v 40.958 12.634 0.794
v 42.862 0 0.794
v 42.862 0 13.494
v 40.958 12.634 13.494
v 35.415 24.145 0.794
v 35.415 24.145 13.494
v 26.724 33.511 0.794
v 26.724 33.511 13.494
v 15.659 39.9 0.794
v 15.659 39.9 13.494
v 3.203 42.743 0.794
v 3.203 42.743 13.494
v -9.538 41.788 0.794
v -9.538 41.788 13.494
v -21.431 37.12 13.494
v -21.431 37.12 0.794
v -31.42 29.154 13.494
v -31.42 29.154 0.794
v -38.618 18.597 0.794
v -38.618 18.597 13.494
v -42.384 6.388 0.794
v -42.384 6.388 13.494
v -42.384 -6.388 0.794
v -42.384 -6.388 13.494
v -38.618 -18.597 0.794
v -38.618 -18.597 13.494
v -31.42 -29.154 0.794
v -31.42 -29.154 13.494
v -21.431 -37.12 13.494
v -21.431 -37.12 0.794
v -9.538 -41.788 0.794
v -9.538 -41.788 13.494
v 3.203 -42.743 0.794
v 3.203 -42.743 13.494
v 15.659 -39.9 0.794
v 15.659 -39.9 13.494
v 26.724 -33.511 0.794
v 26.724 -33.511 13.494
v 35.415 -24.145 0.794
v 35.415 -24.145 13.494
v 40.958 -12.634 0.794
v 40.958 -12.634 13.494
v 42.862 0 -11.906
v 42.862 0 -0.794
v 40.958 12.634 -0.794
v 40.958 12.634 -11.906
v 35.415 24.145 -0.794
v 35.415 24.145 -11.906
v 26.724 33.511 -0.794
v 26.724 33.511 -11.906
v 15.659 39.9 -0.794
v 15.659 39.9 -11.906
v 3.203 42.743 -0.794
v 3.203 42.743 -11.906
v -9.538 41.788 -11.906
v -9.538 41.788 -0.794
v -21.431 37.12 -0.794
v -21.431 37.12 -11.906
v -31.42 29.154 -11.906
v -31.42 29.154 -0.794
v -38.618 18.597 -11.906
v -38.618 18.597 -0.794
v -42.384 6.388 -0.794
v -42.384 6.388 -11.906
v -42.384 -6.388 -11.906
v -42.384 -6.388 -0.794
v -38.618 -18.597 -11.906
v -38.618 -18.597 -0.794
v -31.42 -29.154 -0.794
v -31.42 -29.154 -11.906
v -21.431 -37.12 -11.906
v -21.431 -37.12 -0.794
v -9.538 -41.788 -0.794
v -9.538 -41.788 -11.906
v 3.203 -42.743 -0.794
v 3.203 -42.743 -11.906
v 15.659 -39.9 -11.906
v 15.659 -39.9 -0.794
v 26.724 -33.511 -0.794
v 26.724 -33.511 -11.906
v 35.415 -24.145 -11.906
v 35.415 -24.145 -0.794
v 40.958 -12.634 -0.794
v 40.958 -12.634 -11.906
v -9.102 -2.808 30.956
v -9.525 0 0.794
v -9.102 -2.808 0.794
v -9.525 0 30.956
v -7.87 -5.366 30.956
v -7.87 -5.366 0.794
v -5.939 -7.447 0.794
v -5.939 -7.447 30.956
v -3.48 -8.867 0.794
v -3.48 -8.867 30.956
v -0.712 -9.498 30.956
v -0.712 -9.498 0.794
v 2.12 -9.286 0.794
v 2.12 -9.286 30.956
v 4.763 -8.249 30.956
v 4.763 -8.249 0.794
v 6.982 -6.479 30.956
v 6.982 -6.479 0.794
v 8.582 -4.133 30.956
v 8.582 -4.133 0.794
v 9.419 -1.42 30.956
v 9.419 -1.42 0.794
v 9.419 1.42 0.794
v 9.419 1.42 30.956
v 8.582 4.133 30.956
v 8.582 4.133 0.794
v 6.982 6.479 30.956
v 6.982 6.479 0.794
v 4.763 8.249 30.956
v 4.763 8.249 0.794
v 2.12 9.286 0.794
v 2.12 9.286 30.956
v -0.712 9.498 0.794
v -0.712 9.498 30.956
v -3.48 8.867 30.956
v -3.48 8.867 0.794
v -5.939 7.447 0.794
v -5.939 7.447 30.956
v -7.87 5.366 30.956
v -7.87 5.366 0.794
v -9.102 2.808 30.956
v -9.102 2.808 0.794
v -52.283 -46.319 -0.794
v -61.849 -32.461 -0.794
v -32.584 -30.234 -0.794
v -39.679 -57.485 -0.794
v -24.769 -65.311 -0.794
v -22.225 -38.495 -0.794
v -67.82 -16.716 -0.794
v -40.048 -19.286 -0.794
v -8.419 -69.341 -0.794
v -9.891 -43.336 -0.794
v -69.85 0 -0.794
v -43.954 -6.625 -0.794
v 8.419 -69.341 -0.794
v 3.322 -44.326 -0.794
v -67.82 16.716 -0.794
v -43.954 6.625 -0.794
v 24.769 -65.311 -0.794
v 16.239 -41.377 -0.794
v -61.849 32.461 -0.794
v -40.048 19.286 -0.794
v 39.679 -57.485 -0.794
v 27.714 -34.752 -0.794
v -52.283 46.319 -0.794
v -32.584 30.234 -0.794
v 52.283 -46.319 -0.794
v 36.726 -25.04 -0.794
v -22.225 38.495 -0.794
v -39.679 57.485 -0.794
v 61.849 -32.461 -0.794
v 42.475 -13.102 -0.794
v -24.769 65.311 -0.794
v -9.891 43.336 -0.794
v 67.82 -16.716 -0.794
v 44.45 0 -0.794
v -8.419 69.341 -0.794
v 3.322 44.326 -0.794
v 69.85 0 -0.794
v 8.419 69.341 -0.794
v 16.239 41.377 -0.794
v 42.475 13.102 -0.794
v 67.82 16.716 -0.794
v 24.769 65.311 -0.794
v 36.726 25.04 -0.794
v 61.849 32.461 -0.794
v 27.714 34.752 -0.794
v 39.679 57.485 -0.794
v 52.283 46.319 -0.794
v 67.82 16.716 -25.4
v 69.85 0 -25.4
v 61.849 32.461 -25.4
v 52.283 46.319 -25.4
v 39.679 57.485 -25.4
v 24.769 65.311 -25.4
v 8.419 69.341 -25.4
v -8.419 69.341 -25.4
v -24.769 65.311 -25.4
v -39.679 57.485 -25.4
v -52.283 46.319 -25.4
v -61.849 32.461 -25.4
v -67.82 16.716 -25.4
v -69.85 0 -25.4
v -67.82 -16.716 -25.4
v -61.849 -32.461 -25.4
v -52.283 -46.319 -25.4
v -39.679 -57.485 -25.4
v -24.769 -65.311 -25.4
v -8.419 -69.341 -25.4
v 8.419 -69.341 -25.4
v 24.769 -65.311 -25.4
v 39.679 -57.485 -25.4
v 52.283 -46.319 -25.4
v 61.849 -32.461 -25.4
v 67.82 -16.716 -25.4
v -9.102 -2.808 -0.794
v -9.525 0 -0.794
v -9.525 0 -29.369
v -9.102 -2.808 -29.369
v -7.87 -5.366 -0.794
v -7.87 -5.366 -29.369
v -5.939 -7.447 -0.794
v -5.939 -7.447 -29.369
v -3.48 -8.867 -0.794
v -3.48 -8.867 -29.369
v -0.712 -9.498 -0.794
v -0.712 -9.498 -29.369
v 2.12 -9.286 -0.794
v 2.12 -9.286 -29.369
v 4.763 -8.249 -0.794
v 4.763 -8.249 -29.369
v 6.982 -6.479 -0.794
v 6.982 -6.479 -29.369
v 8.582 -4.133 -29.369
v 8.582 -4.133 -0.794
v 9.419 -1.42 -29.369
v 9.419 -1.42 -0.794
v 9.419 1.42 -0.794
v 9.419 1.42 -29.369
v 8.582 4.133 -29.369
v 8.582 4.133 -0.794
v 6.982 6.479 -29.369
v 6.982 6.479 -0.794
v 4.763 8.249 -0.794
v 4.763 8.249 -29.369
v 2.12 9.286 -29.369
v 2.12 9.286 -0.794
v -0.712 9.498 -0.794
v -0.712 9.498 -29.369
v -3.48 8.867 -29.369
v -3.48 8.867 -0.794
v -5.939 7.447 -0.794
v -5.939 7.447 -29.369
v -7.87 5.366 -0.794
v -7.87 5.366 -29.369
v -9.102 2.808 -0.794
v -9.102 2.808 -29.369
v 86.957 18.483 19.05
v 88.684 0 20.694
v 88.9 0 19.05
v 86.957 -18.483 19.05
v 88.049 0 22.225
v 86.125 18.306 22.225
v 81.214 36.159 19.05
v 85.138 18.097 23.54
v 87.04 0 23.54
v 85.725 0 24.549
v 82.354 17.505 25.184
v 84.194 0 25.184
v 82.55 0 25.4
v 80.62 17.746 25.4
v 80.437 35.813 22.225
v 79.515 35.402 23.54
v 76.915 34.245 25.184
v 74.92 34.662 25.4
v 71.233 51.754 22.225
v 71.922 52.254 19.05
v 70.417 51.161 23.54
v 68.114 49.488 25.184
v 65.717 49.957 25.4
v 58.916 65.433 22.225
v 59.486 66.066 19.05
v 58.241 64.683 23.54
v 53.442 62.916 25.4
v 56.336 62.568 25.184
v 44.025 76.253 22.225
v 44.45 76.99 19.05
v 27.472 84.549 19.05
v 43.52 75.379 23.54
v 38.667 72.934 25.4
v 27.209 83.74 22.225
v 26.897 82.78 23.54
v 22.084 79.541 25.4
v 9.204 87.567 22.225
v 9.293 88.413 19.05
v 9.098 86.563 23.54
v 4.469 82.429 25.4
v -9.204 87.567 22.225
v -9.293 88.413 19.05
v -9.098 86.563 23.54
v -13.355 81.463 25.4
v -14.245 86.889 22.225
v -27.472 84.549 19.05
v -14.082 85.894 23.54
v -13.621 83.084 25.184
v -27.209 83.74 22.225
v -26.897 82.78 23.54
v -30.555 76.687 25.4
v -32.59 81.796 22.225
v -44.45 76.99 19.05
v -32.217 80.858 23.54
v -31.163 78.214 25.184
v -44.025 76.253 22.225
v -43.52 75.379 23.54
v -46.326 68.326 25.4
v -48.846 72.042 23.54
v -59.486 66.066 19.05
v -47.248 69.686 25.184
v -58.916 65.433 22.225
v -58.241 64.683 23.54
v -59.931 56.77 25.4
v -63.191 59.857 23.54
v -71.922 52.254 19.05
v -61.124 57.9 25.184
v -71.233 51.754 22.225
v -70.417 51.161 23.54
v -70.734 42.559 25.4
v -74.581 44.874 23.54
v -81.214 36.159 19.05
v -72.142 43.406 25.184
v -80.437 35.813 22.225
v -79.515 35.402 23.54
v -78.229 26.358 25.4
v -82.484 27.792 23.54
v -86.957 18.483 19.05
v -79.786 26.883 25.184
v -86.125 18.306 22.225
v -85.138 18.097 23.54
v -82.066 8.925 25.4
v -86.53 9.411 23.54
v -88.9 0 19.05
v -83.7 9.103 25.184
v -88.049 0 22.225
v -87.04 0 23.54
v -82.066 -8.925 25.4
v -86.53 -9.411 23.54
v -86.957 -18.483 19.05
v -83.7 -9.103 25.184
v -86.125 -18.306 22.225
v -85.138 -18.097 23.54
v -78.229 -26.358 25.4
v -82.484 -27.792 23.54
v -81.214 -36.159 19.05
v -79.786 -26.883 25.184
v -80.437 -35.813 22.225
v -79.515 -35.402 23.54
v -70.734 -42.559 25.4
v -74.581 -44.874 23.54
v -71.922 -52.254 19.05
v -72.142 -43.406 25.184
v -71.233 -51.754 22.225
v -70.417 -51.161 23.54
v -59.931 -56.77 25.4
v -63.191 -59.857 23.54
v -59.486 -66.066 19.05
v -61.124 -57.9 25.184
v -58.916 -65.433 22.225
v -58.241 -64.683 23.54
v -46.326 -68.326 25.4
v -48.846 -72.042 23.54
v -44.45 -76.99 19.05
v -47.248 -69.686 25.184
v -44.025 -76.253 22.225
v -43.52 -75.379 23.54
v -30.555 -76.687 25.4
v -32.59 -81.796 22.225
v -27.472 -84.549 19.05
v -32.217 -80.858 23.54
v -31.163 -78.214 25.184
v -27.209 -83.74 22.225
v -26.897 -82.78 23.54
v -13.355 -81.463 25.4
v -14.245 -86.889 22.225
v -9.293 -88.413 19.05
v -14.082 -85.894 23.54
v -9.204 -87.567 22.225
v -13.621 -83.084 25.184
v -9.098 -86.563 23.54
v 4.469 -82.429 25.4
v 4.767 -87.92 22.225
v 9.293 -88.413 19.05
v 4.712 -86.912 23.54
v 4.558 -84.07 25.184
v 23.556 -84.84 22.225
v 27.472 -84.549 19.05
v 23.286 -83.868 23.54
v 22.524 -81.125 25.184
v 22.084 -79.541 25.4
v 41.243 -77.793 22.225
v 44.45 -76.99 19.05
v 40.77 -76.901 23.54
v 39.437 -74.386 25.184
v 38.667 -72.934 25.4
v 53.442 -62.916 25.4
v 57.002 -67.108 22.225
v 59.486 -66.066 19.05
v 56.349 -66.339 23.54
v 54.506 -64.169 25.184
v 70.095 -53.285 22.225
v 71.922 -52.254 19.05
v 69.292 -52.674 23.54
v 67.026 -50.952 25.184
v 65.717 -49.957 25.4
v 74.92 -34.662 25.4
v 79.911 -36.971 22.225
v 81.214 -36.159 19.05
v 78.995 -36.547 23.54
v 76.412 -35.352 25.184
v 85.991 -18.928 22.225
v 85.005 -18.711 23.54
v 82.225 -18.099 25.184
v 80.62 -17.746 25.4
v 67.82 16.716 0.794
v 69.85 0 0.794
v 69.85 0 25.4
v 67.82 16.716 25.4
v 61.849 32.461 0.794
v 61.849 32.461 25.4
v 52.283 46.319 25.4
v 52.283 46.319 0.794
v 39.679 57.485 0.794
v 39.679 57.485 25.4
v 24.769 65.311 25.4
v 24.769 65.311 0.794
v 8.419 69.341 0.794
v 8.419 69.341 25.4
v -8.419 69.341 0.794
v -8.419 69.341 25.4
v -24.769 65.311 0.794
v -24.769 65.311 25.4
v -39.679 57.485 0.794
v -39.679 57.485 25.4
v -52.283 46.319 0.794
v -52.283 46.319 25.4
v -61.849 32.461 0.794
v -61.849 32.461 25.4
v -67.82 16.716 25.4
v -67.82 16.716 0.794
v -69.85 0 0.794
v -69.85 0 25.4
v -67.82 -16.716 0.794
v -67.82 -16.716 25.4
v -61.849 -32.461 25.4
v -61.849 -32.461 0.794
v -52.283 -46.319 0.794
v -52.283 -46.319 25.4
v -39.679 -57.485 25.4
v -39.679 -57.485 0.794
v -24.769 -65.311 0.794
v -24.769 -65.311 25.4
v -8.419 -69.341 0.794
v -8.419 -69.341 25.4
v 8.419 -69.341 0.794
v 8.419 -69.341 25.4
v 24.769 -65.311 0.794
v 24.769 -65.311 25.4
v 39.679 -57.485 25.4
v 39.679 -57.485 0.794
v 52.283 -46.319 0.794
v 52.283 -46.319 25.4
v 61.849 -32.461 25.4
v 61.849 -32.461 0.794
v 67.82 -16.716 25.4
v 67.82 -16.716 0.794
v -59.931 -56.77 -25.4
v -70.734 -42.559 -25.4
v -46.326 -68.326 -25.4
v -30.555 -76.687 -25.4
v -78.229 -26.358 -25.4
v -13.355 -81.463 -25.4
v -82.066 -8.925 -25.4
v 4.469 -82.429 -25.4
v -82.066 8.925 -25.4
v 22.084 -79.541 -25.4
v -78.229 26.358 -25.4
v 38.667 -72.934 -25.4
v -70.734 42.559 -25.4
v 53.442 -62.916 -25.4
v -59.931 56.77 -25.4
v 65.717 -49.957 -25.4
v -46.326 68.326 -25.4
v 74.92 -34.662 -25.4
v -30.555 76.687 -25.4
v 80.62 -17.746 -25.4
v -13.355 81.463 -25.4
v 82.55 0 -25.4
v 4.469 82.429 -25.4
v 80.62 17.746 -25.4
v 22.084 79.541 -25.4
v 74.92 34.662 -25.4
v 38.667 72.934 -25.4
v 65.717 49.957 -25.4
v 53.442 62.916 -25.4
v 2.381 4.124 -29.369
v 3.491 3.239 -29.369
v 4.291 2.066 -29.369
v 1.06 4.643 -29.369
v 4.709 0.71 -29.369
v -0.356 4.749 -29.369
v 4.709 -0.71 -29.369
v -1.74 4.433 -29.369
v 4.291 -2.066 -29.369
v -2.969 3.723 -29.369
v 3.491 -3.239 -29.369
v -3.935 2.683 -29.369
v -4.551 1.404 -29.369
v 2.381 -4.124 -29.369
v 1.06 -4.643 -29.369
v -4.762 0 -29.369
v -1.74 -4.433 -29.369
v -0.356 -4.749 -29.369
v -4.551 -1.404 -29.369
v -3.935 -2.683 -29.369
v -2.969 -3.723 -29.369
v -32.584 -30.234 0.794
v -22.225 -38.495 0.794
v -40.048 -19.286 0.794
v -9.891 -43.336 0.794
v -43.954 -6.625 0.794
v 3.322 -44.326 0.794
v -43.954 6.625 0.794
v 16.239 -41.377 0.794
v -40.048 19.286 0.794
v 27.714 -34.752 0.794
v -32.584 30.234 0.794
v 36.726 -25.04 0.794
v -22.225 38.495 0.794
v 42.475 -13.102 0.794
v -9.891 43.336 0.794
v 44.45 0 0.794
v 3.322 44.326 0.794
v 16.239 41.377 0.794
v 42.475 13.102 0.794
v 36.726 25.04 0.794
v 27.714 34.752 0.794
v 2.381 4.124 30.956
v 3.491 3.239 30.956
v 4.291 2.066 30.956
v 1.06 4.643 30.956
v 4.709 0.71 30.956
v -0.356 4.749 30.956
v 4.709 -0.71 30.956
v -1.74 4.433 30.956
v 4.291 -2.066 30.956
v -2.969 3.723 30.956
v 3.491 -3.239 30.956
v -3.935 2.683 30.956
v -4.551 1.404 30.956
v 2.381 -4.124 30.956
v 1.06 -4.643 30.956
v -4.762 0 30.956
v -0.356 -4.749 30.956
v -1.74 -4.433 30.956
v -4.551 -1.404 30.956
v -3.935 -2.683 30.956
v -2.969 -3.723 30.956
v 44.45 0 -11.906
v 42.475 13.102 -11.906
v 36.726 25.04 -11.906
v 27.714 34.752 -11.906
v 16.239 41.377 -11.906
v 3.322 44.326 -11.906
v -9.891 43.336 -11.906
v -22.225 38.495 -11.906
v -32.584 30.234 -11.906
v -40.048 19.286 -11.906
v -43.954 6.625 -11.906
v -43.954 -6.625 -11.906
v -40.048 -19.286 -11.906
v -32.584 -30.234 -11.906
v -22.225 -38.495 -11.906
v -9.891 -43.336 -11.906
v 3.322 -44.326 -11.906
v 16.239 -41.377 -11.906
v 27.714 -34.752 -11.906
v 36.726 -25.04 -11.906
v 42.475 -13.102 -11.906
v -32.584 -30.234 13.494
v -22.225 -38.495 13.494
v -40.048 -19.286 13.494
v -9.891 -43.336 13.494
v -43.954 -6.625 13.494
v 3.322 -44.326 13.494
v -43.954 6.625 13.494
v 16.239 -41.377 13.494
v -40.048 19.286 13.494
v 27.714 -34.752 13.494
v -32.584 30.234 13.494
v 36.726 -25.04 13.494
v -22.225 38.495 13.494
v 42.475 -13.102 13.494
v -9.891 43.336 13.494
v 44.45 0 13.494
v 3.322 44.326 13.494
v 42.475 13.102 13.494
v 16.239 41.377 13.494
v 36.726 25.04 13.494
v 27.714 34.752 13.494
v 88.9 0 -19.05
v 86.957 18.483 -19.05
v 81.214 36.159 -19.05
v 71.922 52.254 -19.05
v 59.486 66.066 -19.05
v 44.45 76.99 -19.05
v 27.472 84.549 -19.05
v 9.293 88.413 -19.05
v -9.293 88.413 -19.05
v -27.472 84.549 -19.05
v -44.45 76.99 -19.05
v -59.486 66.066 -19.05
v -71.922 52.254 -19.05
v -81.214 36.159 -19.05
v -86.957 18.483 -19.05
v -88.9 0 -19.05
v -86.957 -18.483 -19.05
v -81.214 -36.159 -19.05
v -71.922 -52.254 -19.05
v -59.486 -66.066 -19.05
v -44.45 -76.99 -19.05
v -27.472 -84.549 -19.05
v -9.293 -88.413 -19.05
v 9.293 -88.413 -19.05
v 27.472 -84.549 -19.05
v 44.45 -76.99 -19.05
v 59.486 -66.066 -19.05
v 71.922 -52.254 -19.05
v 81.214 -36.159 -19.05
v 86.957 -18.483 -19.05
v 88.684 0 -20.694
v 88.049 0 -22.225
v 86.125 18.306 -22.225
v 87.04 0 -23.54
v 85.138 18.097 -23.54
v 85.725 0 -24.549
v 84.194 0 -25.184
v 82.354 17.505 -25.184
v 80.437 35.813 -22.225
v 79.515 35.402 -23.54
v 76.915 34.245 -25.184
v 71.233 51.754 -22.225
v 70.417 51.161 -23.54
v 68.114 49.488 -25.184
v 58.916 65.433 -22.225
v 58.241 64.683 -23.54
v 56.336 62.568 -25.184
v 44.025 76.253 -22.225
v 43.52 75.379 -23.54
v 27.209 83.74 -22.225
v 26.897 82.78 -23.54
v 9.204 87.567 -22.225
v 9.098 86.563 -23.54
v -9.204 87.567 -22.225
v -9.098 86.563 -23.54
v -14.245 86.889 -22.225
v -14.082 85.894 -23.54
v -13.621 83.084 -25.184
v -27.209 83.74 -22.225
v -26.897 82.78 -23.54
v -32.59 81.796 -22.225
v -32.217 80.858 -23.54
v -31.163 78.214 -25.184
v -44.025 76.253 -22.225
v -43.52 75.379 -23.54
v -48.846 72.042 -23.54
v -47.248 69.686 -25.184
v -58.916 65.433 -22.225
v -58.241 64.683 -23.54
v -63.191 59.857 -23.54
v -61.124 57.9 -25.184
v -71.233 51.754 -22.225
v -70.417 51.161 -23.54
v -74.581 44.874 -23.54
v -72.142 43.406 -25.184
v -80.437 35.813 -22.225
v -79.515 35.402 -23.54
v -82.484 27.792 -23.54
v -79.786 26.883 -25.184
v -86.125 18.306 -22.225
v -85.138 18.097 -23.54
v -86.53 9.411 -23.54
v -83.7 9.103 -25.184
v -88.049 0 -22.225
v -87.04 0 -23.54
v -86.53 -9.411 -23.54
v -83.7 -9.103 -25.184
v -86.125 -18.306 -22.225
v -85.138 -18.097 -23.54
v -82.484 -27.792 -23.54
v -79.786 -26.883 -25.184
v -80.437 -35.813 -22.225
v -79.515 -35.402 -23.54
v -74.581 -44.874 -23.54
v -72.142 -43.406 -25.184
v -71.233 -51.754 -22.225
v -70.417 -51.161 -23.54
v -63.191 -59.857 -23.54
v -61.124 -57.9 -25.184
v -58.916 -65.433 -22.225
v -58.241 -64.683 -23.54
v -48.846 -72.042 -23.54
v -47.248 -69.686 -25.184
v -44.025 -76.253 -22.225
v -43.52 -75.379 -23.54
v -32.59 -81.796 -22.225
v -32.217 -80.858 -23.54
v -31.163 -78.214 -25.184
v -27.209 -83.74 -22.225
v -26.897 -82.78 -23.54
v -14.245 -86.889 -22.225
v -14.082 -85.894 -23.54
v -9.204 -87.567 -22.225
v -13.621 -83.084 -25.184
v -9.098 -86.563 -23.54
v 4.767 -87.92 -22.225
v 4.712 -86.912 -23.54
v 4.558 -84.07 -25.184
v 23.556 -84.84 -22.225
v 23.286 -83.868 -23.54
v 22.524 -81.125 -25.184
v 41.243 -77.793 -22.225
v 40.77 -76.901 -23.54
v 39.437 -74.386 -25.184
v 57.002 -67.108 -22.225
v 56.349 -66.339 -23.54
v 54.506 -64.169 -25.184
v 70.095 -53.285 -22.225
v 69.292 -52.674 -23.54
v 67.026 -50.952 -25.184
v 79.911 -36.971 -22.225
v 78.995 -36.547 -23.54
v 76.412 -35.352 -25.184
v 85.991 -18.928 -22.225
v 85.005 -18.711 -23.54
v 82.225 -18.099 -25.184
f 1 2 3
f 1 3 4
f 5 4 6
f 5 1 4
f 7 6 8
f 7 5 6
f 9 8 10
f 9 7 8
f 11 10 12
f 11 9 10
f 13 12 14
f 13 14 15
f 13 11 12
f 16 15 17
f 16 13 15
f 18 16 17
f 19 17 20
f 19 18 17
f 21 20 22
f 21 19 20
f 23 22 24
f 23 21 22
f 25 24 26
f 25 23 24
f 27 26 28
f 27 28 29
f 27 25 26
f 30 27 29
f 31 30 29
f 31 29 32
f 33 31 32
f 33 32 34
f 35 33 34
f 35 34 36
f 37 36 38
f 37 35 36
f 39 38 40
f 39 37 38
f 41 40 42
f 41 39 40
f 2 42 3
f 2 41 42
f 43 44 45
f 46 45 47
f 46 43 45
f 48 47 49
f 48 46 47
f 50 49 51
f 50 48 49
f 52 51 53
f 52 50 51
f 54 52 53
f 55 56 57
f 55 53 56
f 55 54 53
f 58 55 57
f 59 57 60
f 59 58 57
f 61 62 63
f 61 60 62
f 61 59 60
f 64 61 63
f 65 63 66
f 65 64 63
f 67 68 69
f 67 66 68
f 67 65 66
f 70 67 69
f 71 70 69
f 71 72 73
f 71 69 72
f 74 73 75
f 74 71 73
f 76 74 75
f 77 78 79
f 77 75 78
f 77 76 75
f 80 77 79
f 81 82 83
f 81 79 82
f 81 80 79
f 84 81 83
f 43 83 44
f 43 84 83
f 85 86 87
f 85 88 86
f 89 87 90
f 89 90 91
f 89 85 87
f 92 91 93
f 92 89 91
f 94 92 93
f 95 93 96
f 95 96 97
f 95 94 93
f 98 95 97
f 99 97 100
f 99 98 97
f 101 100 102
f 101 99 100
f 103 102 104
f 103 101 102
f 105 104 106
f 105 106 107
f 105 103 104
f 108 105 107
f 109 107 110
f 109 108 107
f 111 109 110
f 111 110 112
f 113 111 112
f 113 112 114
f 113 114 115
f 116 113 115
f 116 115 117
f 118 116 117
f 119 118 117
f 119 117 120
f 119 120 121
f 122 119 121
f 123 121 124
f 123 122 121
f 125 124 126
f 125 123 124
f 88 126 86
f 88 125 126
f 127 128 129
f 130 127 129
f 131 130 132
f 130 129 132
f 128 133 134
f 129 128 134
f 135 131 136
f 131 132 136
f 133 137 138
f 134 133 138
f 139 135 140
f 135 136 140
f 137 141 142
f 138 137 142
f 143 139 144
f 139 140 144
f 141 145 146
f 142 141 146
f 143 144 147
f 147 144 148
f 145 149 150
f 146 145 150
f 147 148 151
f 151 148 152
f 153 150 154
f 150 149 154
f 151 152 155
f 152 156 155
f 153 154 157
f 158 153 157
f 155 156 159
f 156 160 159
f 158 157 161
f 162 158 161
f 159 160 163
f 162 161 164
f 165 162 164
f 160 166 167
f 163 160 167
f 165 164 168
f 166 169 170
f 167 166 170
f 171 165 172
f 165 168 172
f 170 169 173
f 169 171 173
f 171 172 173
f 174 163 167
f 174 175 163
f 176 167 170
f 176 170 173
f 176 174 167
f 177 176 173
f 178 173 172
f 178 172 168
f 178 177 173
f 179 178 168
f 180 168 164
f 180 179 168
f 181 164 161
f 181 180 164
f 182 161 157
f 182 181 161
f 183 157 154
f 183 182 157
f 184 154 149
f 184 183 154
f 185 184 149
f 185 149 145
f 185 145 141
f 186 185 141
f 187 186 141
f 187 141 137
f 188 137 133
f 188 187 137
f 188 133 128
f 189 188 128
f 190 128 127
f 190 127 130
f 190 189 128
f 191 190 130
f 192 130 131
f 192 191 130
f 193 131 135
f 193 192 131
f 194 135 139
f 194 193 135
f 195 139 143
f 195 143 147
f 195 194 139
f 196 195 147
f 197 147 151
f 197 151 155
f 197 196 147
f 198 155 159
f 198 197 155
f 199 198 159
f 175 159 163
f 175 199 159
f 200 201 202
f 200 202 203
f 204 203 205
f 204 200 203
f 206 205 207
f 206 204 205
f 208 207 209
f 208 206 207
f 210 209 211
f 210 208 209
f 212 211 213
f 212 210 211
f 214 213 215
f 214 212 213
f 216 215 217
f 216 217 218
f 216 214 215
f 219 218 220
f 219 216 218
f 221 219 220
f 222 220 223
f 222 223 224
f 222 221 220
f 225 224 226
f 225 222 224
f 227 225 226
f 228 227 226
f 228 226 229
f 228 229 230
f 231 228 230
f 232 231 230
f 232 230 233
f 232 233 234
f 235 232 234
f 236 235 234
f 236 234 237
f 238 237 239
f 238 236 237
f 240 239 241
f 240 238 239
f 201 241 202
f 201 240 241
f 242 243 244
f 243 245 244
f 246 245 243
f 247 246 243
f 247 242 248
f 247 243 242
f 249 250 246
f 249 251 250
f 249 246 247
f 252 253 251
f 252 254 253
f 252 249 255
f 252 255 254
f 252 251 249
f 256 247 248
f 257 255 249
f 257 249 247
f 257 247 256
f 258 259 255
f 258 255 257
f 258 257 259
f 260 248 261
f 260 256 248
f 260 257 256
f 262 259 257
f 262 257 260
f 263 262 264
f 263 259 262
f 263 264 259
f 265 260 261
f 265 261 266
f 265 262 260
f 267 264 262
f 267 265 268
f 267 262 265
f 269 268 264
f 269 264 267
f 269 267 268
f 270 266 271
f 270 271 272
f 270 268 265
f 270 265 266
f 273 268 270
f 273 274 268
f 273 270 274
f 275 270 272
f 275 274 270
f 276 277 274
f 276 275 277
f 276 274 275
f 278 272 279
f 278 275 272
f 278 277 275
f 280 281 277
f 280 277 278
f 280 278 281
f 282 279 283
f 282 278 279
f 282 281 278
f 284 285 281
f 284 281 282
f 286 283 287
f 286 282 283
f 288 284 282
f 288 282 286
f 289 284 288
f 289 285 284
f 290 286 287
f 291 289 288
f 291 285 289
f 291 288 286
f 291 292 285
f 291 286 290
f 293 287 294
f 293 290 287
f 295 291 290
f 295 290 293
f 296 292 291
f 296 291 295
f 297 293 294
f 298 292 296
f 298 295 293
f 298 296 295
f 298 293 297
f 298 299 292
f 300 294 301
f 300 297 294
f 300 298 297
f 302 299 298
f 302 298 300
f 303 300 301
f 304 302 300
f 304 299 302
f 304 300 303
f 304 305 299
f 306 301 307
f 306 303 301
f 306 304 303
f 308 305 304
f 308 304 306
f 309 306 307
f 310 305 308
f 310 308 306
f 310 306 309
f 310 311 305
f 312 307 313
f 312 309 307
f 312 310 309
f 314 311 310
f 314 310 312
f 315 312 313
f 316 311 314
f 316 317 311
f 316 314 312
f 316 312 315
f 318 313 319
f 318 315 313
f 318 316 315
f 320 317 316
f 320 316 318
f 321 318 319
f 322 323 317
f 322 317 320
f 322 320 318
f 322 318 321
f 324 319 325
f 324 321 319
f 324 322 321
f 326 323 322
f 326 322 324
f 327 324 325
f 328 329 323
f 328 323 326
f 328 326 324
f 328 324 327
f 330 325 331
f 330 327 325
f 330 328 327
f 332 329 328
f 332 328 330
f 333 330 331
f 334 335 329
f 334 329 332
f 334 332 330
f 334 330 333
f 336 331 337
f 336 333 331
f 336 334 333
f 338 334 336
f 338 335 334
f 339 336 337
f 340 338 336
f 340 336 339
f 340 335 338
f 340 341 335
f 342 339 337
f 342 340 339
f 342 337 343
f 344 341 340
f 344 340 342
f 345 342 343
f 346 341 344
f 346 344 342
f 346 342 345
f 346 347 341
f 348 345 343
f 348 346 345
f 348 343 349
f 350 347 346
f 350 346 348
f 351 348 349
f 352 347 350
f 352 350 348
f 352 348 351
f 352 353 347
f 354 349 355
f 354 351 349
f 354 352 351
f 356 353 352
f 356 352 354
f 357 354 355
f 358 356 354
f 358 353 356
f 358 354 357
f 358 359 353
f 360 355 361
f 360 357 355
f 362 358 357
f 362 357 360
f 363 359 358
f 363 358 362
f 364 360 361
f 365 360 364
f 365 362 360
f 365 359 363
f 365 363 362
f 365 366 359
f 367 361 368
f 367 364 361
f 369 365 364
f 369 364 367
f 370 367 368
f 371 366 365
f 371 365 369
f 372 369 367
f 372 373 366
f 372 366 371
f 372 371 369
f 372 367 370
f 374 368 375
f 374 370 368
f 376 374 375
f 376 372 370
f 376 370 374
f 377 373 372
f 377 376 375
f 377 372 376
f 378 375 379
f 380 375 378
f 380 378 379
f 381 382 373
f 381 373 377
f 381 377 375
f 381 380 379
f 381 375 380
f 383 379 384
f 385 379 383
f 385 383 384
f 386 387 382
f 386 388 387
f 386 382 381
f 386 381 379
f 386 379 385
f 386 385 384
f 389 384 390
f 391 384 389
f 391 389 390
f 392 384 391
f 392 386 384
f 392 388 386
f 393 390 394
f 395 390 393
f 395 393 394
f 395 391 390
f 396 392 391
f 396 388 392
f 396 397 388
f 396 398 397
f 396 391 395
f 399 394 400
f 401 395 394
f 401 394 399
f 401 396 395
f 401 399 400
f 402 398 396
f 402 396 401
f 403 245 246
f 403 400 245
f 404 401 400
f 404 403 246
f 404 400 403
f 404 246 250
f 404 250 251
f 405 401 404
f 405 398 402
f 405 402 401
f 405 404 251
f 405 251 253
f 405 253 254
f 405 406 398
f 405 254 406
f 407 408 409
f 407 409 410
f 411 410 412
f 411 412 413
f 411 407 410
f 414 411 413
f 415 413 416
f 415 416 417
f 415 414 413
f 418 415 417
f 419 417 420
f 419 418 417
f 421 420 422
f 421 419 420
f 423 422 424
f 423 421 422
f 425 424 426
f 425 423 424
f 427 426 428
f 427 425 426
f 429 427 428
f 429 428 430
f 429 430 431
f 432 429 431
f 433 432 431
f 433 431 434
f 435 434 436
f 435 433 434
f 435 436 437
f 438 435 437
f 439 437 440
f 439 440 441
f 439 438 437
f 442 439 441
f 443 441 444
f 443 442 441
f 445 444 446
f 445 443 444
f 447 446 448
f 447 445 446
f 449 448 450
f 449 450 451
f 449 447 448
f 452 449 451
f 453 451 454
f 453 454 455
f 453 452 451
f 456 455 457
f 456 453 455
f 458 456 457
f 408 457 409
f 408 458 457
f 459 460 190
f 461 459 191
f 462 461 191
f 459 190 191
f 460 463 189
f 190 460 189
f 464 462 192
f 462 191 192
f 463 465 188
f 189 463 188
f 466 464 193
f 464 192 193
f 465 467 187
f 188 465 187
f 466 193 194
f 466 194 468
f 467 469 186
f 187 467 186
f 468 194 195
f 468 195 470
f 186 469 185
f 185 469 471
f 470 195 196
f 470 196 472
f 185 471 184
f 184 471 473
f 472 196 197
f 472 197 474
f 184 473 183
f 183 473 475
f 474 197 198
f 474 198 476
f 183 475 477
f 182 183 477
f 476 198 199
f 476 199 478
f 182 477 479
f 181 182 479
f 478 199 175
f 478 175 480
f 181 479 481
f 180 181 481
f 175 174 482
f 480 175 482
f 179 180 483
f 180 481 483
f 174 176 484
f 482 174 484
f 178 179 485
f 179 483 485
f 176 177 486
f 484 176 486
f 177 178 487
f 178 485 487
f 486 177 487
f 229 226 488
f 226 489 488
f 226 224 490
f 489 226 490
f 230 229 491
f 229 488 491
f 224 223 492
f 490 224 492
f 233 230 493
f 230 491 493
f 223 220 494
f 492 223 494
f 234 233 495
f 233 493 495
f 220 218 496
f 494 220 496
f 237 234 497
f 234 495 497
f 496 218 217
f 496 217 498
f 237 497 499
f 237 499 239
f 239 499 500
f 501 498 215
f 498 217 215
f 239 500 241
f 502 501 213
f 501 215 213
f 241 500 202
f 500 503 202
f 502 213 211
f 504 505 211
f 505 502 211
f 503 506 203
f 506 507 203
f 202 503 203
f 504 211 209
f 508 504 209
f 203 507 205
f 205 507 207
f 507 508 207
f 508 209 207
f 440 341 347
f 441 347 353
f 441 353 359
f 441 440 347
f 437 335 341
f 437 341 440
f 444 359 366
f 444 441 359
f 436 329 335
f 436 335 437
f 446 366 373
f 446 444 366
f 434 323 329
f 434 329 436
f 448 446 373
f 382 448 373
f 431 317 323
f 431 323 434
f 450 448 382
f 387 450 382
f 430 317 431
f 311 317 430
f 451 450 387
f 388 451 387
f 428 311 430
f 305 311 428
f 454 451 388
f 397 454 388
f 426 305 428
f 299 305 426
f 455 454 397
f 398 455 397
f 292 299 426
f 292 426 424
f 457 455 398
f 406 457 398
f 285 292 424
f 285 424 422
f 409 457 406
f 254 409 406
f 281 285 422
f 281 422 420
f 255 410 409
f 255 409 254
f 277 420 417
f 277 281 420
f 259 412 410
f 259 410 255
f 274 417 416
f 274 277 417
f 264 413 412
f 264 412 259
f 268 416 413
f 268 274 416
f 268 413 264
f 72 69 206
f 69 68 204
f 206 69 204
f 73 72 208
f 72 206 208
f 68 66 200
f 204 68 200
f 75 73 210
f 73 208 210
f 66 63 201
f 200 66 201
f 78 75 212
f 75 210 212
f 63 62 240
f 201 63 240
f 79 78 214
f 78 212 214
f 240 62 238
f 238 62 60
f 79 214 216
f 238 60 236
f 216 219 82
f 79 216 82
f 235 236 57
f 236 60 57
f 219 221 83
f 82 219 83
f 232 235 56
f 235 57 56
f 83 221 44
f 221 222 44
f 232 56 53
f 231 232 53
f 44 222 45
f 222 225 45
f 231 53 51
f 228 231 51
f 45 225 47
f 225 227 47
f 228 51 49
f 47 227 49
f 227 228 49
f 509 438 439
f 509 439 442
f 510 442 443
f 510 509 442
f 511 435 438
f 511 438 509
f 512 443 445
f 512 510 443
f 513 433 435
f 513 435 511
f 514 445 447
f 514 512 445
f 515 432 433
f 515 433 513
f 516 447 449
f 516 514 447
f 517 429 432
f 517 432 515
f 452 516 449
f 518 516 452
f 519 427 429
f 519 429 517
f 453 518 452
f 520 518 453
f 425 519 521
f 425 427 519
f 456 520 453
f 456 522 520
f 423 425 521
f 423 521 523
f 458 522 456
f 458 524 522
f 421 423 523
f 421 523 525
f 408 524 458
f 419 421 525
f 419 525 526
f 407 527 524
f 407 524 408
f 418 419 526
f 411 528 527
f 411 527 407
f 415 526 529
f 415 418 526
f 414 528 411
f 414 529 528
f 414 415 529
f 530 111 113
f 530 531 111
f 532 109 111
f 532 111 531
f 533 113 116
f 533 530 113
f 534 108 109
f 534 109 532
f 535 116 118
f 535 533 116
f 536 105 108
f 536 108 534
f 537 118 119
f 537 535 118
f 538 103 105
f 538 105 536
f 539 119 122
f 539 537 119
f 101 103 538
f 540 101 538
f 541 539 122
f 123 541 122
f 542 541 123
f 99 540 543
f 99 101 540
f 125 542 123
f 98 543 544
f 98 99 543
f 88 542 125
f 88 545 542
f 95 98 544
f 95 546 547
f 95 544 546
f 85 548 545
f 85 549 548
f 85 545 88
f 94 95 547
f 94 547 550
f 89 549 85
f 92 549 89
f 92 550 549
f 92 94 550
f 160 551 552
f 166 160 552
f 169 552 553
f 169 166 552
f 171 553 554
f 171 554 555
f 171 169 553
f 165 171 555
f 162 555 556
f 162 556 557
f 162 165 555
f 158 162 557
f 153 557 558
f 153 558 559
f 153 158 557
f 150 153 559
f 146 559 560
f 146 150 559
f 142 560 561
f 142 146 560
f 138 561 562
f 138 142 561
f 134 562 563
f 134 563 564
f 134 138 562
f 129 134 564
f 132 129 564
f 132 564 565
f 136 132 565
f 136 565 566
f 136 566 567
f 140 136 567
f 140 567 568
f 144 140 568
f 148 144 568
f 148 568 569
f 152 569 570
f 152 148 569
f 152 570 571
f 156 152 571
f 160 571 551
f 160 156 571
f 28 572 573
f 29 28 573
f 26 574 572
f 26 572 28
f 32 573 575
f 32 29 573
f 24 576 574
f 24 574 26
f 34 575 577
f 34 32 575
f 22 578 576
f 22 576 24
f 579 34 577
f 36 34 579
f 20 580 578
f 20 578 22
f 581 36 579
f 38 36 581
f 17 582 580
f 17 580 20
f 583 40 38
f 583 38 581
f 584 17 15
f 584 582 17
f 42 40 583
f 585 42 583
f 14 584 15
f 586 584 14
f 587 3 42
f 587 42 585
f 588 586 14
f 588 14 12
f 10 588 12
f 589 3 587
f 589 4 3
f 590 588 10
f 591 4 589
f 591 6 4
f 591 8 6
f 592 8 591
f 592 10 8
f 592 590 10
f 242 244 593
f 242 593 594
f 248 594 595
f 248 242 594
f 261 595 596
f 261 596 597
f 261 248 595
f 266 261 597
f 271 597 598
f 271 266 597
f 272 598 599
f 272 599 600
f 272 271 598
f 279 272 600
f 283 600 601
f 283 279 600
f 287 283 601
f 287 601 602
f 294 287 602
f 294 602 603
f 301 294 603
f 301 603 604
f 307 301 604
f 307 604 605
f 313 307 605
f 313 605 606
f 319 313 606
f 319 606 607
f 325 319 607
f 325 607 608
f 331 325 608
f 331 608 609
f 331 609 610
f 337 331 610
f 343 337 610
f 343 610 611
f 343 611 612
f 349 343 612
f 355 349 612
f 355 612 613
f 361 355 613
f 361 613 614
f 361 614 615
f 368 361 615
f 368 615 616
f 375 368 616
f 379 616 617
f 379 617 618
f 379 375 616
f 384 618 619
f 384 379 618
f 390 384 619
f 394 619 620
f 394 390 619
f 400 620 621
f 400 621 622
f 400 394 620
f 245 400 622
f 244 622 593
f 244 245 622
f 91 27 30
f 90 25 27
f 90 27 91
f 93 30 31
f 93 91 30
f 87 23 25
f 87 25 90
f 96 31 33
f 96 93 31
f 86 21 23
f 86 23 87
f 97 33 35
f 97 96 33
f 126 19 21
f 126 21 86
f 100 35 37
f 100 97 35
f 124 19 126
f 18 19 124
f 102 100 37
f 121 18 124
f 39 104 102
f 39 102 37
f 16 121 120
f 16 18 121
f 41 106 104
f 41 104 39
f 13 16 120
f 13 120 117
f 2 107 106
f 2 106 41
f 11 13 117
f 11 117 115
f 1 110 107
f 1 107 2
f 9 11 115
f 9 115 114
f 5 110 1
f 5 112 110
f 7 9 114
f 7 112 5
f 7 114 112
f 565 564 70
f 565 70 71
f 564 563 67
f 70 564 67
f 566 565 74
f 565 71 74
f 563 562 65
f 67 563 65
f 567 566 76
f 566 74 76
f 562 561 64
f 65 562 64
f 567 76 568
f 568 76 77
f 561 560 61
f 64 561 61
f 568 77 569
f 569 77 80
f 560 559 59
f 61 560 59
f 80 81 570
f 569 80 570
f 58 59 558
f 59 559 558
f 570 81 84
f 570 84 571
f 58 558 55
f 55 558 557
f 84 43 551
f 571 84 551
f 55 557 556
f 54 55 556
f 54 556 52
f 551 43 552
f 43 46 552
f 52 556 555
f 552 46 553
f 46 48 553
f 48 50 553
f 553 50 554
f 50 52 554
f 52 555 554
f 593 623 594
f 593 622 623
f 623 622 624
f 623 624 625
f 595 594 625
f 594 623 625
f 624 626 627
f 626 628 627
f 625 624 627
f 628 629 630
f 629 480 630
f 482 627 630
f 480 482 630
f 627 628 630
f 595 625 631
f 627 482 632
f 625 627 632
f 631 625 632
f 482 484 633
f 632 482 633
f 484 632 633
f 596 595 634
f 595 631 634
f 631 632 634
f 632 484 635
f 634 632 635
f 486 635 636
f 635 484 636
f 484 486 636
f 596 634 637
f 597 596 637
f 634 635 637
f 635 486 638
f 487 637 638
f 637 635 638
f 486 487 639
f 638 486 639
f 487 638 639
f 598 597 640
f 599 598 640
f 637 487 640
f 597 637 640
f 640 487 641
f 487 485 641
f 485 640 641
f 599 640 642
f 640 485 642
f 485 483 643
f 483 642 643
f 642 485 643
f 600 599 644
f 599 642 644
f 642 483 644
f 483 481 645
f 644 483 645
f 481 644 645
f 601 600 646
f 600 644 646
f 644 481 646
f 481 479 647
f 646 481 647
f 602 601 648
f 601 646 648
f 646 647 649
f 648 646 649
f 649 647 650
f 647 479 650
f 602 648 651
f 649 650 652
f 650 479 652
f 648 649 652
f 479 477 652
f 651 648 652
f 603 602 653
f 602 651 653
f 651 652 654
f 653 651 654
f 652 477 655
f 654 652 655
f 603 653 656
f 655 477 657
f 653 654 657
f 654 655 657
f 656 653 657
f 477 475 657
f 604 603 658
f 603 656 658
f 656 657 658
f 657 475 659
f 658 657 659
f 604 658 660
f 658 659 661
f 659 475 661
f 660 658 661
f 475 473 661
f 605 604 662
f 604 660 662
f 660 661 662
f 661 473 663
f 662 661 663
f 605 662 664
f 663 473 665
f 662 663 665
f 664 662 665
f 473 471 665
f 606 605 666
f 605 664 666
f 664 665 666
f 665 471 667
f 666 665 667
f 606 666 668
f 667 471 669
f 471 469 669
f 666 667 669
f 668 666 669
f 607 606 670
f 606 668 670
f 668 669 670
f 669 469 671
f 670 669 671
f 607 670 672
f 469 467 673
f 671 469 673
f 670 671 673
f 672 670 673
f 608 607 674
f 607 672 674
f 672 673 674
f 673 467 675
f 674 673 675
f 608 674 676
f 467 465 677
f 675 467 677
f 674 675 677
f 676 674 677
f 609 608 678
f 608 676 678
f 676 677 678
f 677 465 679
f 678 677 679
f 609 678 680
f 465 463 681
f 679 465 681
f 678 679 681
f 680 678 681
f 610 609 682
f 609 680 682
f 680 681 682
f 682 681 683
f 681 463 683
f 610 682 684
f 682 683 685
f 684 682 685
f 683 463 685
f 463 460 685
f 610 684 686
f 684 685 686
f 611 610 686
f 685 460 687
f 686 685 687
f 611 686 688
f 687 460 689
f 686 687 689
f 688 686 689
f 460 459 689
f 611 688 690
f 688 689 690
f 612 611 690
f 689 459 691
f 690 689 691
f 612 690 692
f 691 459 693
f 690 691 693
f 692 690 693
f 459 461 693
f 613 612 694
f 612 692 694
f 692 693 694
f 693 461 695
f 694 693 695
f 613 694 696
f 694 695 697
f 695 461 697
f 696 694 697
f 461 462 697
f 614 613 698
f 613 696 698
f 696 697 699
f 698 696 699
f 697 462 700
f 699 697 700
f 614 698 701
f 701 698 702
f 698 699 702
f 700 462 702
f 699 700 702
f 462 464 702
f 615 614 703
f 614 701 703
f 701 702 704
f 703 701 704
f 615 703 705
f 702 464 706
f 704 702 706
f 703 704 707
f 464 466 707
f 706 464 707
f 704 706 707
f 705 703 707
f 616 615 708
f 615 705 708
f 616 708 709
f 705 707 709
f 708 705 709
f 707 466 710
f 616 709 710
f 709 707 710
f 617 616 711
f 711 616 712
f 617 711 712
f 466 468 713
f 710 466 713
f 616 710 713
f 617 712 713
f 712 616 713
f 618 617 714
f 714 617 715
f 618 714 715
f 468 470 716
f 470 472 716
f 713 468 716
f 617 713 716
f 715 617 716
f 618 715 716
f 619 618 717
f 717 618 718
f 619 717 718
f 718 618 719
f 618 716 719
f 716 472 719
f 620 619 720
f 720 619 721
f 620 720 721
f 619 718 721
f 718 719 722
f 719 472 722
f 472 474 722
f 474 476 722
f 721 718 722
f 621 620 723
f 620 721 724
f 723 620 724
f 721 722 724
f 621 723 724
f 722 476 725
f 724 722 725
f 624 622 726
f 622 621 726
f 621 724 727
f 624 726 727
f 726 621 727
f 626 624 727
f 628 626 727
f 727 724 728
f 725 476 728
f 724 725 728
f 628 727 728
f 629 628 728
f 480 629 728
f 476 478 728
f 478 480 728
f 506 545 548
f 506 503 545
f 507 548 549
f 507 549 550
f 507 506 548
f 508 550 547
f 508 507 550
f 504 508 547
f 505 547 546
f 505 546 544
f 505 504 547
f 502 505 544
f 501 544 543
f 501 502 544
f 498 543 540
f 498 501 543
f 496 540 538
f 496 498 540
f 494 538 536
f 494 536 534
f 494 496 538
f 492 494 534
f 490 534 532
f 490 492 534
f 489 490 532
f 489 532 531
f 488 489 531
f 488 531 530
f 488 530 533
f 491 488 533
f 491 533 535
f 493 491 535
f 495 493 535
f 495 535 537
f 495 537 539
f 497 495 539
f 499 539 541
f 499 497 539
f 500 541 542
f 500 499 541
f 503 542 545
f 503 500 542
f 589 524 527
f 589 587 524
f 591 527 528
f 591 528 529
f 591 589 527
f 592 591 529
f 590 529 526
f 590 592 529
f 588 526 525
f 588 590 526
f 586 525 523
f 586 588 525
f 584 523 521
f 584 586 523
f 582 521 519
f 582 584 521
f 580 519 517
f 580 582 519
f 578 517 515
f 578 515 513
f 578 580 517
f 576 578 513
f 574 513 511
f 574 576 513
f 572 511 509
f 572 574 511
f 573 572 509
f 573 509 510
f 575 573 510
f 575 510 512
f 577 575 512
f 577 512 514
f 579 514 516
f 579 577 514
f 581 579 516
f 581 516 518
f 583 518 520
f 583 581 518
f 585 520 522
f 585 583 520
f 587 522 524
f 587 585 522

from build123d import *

# Parameters (mm, degrees)
SKETCH1_R      = 88.9
SKETCH1_R_2    = 69.85
EXTRUDE1_DEPTH = 25.4
FILLET1_R      = 6.35
SKETCH2_R      = 69.85
SKETCH2_R_2    = 9.525
EXTRUDE2_DEPTH = 0.79375
SKETCH3_R      = 9.525
SKETCH3_R_2    = 4.7625
EXTRUDE3_DEPTH = 30.1625
SKETCH4_R      = 44.45
SKETCH4_R_2    = 42.8625
EXTRUDE4_DEPTH = 12.7


with BuildPart() as part:
    # Sketch1 → Extrude1 (new, symmetric)
    with BuildSketch(Plane.XY):
        Circle(SKETCH1_R)
        Circle(SKETCH1_R_2, mode=Mode.SUBTRACT)
    extrude(amount=EXTRUDE1_DEPTH, both=True)

    # Fillet1
    fillet1_edges = [part.edges().sort_by_distance(p)[0] for p in [
        (-88.9, 0, -25.4),
        (-88.9, 0, 25.4),
    ]]
    fillet(fillet1_edges, radius=FILLET1_R)

    # Sketch2 → Extrude2 (add, symmetric)
    with BuildSketch(Plane.XY):
        Circle(SKETCH2_R)
        Circle(SKETCH2_R_2, mode=Mode.SUBTRACT)
    extrude(amount=EXTRUDE2_DEPTH, both=True)

    # Sketch3 → Extrude3 (add, symmetric)
    with BuildSketch(Plane.XY.offset(0.79375)):
        with Locations(Location((0, 0, 0), (0, 0, 180))):
            Circle(SKETCH3_R)
        with Locations(Location((0, 0, 0), (0, 0, 180))):
            Circle(SKETCH3_R_2, mode=Mode.SUBTRACT)
    extrude(amount=EXTRUDE3_DEPTH, both=True)

    # Sketch4 → Extrude4 (add, symmetric)
    with BuildSketch(Plane.XY.offset(0.79375)):
        Circle(SKETCH4_R)
        Circle(SKETCH4_R_2, mode=Mode.SUBTRACT)
    extrude(amount=EXTRUDE4_DEPTH, both=True)


solid = part.part
